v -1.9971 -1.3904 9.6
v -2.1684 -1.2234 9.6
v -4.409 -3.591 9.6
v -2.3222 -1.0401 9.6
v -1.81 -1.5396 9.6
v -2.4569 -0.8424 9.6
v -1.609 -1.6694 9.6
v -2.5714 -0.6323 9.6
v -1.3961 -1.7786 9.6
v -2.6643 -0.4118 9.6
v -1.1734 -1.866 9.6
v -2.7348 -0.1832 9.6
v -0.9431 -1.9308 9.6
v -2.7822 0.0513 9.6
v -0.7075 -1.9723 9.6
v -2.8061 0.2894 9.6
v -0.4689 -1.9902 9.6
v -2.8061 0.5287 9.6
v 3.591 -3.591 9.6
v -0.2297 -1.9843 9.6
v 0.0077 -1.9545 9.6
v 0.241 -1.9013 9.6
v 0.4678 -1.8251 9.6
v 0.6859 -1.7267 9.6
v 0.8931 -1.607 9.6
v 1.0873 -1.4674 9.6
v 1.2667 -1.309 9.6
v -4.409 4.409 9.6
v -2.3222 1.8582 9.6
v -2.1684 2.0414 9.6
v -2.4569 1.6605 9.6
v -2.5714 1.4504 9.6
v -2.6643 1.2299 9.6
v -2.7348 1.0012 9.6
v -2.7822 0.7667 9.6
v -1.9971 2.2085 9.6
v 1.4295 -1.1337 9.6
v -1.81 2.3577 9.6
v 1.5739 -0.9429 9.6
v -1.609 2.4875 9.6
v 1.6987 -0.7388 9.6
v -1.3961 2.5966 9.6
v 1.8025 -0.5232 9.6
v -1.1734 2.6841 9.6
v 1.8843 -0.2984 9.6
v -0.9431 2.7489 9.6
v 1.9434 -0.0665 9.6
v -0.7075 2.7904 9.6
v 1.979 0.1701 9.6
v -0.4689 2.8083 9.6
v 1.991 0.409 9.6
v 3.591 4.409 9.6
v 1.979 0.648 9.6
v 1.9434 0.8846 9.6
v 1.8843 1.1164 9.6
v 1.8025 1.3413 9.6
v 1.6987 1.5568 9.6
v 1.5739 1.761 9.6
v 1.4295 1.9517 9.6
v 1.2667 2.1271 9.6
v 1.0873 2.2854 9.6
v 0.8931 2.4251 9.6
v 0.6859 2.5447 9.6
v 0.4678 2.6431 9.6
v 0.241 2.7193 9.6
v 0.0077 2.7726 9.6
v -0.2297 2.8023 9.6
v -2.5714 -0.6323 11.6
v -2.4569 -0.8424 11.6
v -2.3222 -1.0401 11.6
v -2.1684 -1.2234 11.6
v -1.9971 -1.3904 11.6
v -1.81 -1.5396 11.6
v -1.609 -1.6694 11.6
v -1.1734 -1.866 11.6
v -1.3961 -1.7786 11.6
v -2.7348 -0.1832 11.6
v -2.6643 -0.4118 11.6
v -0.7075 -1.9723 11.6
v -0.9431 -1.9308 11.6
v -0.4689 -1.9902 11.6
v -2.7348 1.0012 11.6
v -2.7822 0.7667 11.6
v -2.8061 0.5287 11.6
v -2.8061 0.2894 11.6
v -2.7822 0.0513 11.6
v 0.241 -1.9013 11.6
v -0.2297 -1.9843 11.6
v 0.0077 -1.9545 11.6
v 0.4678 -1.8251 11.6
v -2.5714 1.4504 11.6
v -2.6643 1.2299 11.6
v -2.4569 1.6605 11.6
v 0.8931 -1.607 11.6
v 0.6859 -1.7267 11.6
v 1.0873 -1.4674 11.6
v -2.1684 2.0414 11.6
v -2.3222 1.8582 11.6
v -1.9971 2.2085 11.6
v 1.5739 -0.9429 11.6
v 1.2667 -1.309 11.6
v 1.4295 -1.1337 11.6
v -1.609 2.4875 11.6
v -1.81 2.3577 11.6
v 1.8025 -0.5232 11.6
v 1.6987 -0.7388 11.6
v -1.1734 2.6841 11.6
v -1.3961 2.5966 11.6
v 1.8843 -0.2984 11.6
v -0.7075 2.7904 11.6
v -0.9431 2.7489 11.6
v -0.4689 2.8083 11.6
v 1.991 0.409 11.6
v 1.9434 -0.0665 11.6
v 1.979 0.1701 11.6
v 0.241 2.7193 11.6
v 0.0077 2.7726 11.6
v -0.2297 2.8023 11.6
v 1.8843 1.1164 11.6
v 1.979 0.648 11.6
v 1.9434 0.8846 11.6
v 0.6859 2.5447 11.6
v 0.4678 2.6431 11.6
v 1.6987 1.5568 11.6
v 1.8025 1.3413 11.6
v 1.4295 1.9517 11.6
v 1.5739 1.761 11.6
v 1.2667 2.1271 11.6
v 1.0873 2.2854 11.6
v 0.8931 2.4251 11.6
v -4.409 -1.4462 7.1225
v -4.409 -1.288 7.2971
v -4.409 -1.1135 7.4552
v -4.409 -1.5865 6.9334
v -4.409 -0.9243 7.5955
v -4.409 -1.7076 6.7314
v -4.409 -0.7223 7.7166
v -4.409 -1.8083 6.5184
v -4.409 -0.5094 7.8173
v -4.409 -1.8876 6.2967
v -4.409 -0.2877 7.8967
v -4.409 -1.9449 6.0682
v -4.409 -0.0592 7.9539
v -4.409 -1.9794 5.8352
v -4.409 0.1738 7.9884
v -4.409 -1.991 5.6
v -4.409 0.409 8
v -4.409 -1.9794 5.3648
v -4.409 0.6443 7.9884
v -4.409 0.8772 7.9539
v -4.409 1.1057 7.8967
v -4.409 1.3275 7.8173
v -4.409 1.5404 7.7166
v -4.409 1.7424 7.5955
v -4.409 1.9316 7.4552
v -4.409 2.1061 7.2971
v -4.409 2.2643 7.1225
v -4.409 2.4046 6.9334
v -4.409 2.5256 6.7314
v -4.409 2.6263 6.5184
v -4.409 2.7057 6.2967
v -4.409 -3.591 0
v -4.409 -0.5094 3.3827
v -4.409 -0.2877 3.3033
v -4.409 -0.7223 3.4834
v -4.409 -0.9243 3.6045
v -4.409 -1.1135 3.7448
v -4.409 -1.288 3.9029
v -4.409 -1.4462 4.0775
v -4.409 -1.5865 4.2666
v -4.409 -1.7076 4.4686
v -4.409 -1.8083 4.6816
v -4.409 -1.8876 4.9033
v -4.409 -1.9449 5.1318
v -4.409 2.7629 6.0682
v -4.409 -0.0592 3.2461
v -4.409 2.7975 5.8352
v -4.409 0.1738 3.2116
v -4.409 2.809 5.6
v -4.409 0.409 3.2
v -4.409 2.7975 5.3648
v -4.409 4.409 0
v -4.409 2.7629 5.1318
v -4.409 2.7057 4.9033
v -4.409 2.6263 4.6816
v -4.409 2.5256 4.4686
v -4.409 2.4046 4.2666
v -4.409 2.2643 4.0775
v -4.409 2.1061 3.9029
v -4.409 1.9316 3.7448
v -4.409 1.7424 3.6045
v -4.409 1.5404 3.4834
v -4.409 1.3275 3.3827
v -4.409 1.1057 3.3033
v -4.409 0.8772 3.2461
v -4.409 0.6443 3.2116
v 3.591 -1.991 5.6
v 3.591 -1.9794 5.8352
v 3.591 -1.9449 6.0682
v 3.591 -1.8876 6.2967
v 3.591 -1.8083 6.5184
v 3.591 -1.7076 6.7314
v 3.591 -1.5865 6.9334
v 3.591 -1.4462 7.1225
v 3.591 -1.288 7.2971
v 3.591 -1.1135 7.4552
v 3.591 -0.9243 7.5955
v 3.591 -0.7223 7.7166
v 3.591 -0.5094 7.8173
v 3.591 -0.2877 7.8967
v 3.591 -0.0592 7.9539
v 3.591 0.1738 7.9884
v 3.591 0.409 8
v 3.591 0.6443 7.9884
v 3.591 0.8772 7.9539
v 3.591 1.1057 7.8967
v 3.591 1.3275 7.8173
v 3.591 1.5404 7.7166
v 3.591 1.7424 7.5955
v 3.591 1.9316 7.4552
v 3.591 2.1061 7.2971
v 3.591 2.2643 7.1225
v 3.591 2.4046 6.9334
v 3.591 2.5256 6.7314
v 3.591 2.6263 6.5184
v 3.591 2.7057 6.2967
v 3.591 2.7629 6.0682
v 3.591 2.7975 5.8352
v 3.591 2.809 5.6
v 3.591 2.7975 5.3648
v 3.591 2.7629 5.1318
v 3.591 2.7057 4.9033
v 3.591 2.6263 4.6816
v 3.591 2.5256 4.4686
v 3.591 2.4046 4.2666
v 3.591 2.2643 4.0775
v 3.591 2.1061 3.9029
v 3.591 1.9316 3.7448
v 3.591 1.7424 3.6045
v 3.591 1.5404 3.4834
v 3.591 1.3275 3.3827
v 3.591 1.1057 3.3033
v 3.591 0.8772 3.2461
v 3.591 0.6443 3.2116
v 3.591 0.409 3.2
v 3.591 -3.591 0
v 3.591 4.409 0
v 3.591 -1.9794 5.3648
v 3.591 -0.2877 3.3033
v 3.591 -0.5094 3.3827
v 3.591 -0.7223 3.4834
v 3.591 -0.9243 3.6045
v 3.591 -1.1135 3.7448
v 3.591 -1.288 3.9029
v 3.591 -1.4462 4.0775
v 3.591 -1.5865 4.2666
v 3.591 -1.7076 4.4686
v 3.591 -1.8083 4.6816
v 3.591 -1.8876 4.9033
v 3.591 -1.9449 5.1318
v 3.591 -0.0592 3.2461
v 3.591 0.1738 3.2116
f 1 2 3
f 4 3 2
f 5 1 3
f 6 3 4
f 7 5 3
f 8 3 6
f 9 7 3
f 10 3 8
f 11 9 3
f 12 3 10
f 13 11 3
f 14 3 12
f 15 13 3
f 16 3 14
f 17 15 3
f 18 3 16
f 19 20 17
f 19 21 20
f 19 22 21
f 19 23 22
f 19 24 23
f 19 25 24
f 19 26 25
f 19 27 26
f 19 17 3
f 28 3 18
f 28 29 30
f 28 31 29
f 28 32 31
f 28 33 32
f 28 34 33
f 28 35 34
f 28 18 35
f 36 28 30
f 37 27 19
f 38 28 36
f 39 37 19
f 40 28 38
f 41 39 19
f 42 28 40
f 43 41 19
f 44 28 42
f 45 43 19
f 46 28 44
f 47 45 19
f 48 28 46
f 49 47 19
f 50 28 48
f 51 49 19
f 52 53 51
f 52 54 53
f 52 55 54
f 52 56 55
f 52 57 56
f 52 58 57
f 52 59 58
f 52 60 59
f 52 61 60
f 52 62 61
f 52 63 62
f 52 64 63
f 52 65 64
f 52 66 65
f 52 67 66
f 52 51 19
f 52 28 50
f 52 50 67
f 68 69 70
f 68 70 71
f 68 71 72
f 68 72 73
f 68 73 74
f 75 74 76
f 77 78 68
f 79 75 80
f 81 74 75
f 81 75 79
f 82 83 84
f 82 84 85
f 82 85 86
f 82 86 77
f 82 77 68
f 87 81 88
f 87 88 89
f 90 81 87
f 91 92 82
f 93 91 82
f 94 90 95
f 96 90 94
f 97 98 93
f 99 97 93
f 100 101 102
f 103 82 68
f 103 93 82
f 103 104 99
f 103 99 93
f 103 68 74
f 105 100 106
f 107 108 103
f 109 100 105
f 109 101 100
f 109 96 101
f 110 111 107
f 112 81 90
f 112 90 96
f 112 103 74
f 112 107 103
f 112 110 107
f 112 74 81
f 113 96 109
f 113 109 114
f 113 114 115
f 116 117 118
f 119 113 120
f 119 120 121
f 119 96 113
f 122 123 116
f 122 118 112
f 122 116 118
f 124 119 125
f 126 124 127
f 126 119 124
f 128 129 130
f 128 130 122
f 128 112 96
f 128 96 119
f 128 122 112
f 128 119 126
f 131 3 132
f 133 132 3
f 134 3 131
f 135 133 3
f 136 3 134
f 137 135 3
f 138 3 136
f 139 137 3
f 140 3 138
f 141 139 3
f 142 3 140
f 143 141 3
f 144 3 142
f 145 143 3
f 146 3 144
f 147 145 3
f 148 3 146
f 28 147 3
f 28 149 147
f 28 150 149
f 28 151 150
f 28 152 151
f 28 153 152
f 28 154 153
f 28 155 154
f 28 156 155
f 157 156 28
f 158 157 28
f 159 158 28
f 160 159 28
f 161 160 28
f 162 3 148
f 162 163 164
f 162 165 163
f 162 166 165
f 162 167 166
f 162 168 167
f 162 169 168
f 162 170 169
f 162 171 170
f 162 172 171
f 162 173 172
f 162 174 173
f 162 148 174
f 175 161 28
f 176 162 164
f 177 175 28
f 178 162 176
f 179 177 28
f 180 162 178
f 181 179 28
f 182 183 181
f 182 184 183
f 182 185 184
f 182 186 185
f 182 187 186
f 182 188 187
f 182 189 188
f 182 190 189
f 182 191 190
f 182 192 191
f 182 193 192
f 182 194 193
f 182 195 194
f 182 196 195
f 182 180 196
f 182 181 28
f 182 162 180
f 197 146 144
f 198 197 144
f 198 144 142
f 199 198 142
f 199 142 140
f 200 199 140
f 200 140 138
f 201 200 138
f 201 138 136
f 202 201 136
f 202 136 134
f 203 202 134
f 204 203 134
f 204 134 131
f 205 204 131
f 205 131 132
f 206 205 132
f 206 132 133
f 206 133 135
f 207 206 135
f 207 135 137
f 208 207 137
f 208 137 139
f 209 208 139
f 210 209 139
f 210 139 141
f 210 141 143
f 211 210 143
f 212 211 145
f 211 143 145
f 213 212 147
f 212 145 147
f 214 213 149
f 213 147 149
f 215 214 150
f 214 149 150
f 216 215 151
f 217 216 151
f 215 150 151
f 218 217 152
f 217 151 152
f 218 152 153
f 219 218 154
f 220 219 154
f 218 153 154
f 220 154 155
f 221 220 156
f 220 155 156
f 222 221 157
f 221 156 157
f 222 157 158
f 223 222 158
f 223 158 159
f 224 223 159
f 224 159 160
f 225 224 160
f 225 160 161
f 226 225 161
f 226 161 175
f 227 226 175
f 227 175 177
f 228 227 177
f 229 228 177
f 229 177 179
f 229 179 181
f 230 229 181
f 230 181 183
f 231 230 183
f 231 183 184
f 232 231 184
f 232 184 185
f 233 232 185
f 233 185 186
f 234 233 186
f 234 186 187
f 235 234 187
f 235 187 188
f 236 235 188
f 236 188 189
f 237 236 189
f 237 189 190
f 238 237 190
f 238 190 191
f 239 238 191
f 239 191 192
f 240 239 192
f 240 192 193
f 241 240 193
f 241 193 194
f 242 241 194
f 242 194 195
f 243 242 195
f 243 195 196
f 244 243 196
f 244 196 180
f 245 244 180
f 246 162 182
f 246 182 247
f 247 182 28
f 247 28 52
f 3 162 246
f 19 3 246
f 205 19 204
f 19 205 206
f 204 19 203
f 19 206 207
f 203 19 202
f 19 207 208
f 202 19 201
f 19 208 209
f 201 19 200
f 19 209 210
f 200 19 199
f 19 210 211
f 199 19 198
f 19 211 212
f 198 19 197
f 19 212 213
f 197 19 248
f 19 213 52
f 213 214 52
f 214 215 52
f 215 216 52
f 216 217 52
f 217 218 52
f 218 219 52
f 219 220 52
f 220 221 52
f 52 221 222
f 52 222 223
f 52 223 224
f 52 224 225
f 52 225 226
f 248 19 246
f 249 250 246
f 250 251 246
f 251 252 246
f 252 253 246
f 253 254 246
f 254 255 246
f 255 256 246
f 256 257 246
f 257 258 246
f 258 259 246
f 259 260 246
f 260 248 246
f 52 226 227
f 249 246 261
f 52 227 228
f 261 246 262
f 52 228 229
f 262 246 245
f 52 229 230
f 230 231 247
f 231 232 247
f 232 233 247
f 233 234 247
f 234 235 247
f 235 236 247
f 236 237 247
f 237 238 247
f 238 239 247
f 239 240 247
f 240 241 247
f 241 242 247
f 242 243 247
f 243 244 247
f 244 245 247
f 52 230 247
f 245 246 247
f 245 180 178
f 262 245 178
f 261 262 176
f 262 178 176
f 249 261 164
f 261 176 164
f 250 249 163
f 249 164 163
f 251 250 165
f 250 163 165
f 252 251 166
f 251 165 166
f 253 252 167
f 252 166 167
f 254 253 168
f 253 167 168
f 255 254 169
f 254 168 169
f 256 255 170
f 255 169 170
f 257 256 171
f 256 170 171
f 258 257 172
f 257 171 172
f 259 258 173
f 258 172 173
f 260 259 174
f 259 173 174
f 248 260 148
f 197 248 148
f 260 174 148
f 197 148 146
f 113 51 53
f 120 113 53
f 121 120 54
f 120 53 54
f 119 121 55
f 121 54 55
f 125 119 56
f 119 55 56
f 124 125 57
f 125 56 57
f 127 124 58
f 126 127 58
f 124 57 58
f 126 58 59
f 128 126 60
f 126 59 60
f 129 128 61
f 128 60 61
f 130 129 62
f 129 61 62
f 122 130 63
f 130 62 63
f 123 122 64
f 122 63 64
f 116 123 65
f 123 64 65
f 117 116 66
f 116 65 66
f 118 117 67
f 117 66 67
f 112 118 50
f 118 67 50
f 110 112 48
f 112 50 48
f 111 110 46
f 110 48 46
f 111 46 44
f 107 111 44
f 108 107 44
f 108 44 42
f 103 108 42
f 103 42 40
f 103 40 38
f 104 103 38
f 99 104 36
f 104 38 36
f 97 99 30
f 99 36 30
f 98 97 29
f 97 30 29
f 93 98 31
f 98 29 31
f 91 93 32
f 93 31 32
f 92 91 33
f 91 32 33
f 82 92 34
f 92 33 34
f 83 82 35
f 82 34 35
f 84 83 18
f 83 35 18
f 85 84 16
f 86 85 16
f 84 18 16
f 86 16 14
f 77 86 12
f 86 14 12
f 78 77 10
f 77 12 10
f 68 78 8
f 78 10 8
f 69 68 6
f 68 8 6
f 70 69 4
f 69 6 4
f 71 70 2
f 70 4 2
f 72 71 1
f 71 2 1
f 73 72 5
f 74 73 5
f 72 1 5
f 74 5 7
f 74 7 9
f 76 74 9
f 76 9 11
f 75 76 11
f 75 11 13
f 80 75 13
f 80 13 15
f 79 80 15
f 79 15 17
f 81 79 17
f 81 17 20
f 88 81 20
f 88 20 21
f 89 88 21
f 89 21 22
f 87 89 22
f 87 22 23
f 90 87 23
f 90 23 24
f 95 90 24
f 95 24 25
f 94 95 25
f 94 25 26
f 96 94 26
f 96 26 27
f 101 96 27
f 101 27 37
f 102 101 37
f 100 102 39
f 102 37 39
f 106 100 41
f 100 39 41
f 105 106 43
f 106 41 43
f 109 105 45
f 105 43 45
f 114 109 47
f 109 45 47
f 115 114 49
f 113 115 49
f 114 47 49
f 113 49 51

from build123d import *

# Parameters (mm, degrees)
F0_W     = 8
F0_H     = 8
F1_DEPTH = 9.6
F3_DEPTH = 25
F4_R     = 2.4
F5_DEPTH = 2


with BuildPart() as f1:
    # F0 (on Top) → F1 (new body)
    with BuildSketch(Plane.XY):
        with Locations((-0.409037, 0.409032)):
            Rectangle(F0_W, F0_H)
    extrude(amount=F1_DEPTH)

    # F2 (on face) → F3 (cut)
    with BuildSketch(Plane(origin=(-4.409037, 0, 0), x_dir=(0, -1, 0), z_dir=(-1, 0, 0))):
        with BuildLine():
            ThreePointArc((1.990968, 5.6), (-2.106088, 7.297056), (-0.409032, 3.2))
            ThreePointArc((-0.409032, 3.2), (1.288024, 3.902944), (1.990968, 5.6))
        make_face()
    extrude(amount=-F3_DEPTH, mode=Mode.SUBTRACT)

    # F4 (on face) → F5 (join)
    with BuildSketch(Plane.XY.offset(9.6)):
        with Locations((-0.409037, 0.409032)):
            Circle(F4_R)
    extrude(amount=F5_DEPTH)


solid = f1.part
